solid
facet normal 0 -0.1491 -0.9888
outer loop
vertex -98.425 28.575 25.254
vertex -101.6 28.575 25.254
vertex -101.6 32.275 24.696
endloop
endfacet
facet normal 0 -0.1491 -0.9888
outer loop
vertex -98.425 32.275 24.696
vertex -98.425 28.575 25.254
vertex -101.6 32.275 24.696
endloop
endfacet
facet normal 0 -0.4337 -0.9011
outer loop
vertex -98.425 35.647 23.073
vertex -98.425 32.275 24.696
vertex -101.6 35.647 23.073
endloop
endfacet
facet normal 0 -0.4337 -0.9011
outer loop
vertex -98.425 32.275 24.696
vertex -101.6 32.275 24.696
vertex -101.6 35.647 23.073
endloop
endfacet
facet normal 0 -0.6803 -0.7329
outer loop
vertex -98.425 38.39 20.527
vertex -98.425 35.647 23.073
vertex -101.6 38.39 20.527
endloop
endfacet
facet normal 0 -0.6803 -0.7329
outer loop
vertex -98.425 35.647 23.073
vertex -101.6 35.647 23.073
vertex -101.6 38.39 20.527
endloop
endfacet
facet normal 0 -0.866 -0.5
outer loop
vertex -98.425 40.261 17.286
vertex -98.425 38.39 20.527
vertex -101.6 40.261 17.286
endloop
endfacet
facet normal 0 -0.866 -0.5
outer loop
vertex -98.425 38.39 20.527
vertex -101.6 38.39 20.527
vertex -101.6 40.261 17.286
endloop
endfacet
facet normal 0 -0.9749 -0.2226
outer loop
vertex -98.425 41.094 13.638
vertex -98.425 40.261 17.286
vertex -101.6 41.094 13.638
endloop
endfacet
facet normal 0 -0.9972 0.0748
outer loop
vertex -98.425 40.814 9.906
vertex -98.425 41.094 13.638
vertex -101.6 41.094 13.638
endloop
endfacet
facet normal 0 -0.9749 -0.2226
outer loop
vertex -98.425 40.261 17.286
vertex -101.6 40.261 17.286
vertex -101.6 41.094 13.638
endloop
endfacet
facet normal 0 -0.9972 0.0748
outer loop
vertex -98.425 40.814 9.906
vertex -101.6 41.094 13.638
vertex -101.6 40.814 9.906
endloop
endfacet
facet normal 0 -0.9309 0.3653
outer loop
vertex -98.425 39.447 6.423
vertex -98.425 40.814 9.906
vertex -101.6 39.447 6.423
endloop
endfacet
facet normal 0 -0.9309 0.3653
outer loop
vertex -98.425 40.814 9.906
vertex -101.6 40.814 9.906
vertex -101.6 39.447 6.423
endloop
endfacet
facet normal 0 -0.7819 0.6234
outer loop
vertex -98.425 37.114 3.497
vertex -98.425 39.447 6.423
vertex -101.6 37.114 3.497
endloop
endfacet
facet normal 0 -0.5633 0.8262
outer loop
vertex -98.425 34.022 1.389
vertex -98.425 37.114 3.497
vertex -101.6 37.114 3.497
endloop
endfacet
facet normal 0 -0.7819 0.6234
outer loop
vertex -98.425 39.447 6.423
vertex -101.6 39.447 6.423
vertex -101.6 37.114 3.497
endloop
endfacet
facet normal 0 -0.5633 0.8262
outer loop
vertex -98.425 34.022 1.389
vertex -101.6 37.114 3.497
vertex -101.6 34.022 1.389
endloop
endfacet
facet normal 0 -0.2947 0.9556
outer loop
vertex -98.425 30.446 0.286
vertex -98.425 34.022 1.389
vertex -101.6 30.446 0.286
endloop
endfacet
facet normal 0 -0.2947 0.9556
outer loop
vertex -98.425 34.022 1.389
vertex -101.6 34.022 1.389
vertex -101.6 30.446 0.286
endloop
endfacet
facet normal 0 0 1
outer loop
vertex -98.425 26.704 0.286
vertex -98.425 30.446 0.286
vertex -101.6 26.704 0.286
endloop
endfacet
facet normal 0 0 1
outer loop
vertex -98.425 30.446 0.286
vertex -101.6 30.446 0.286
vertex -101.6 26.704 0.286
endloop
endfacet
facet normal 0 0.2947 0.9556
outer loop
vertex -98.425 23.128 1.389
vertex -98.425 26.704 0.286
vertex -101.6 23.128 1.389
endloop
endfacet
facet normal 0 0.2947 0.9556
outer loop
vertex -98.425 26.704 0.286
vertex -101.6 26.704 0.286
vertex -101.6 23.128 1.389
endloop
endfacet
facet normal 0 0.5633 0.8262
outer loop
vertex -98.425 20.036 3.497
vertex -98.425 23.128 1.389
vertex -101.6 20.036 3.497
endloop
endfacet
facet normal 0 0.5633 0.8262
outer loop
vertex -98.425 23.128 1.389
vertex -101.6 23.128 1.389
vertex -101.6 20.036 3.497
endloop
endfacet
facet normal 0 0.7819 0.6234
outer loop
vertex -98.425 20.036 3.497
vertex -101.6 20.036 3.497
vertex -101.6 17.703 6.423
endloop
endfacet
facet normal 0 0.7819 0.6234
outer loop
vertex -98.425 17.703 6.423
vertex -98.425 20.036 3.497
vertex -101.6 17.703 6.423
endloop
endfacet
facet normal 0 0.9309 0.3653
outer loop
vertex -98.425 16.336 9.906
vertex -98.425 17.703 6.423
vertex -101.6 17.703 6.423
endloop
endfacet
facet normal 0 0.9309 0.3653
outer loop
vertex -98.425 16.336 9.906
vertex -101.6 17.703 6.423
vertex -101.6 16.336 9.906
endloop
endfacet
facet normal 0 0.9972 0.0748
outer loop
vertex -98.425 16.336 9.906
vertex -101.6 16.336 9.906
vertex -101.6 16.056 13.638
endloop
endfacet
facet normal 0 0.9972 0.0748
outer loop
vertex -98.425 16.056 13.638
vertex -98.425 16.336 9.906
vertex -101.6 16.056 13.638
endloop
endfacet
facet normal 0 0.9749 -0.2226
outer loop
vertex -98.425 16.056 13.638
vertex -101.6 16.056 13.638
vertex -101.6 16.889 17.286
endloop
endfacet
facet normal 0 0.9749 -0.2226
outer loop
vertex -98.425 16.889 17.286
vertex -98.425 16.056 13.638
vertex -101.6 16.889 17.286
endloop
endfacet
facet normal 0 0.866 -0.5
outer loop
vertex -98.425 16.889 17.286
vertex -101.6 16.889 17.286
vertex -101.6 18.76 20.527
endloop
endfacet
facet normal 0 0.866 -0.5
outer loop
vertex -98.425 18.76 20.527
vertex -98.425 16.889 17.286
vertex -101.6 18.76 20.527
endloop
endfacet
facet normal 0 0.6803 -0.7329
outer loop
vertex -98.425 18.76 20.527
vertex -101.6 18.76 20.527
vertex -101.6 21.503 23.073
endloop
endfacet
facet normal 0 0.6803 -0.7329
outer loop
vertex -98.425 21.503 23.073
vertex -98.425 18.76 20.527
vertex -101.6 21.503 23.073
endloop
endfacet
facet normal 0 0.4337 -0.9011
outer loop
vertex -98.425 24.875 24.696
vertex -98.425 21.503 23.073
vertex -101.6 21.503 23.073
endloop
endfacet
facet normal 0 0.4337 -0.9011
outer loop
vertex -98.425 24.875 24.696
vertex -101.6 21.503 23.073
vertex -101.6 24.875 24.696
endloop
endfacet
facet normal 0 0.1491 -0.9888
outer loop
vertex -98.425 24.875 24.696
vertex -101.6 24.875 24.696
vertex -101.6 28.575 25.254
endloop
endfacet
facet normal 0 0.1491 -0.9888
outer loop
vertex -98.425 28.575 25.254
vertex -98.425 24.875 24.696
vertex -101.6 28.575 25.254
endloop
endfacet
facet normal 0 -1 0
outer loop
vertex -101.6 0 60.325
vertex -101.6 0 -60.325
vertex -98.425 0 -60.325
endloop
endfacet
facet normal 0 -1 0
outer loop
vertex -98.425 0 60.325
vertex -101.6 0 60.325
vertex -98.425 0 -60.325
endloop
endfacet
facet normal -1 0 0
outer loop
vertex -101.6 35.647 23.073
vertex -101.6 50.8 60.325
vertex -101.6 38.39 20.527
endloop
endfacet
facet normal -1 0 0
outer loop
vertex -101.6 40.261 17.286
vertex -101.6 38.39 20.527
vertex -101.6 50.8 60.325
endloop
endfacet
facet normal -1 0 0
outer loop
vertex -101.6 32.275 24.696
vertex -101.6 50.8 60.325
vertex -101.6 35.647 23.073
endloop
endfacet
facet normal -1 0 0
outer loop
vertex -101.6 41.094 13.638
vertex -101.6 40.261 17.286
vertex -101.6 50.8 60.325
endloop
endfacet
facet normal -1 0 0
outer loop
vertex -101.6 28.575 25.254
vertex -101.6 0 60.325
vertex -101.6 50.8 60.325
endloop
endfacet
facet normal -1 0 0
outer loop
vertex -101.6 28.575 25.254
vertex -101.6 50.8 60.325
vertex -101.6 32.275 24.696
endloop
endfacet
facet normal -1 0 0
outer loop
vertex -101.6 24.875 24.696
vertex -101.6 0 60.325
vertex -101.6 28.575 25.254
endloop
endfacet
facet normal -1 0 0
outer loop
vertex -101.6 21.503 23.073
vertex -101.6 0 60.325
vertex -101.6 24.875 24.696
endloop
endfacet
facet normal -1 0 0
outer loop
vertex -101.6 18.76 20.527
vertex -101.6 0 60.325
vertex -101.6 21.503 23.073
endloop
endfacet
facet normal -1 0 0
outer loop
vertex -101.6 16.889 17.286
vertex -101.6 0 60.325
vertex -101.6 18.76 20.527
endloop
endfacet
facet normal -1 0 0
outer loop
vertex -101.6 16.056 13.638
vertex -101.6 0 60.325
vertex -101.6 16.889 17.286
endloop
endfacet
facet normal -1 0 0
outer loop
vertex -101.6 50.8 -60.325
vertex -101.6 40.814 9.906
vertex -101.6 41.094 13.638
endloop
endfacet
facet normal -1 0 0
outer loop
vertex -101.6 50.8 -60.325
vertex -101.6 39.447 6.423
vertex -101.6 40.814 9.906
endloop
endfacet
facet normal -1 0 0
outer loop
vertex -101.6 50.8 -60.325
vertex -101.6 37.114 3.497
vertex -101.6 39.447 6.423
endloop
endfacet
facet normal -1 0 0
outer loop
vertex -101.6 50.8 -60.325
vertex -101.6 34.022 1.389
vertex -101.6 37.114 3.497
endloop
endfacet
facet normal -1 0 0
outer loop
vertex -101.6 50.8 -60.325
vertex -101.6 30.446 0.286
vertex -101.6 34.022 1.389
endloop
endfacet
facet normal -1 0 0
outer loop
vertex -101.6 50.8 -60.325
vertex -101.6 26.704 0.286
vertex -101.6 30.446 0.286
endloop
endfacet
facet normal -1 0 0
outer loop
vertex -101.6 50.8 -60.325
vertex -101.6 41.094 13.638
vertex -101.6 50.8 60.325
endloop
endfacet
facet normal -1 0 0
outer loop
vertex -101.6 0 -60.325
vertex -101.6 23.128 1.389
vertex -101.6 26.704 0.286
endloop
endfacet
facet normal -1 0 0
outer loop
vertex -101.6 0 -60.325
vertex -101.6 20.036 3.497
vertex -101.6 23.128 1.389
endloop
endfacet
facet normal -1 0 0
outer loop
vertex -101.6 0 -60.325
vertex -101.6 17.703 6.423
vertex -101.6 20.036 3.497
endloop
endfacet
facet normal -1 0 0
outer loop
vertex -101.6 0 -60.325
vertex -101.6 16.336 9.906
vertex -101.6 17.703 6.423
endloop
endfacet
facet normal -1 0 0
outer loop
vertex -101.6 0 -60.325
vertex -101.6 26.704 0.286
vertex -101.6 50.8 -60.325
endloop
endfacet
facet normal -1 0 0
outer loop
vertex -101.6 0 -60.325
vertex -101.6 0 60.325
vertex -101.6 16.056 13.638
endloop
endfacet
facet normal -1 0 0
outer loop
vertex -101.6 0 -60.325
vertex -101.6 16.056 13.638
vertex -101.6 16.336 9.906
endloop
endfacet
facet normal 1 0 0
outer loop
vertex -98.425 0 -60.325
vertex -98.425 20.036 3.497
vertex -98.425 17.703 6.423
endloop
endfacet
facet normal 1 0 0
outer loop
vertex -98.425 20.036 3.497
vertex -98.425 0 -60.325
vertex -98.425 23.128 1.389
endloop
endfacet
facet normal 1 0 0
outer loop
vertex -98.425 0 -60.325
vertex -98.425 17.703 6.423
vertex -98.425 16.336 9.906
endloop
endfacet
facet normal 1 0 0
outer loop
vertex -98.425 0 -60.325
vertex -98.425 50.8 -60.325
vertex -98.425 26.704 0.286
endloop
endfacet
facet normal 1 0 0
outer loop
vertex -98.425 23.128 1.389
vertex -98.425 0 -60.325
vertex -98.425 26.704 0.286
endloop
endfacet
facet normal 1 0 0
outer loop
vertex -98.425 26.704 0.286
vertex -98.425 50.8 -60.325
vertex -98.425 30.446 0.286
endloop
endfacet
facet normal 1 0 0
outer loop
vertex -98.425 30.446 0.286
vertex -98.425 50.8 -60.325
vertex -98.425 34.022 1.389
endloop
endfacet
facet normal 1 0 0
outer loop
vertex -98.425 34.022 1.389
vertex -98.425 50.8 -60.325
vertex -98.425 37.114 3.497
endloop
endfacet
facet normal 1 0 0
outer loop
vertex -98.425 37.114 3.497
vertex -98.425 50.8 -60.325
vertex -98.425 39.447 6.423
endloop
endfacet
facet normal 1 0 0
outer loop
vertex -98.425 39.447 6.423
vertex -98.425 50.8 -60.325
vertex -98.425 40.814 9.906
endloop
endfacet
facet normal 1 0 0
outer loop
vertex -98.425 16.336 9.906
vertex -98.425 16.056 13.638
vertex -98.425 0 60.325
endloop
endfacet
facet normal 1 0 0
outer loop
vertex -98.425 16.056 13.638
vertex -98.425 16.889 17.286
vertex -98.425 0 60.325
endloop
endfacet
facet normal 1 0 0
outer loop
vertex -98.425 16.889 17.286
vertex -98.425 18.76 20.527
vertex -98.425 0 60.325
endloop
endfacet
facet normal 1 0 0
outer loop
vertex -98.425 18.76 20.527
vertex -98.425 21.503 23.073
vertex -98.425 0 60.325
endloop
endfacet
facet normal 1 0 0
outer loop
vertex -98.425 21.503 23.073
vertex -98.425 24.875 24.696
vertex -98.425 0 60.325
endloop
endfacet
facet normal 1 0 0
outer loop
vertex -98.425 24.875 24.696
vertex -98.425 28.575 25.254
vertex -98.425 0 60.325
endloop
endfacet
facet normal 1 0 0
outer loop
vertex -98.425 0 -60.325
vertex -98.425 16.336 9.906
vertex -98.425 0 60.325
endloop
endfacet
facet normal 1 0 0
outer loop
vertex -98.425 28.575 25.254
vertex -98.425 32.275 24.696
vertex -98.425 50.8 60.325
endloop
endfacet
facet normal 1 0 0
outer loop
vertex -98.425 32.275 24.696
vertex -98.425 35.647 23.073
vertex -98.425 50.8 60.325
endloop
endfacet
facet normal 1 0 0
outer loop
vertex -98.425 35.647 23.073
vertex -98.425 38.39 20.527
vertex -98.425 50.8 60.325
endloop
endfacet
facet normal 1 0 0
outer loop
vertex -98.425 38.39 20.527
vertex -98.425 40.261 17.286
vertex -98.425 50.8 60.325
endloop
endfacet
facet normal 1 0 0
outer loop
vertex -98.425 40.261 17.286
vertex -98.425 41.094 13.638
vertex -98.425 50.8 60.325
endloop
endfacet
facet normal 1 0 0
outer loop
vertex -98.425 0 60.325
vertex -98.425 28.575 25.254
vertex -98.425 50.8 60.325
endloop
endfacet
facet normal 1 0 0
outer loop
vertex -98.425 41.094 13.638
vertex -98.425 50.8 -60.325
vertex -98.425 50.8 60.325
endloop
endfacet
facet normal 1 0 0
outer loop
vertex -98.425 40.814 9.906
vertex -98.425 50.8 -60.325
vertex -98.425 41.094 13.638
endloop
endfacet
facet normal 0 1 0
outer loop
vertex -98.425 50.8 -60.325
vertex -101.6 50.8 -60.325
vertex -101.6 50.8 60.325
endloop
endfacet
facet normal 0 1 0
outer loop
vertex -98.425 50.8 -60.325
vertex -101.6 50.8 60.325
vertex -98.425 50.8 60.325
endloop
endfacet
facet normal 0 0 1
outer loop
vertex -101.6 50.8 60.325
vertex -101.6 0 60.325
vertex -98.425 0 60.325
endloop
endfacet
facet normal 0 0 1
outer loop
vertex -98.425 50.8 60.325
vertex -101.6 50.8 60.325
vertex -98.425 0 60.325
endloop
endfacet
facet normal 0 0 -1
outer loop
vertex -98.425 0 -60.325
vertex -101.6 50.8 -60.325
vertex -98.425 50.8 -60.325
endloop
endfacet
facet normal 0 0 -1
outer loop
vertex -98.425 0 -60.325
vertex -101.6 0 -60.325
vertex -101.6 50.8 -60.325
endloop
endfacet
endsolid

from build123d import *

# Parameters (mm, degrees)
SKETCH1_W           = 203.2
SKETCH1_H           = 120.65
BOSS_EXTRUDE1_DEPTH = 50.8
SKETCH2_W           = 196.85
SKETCH2_H           = 114.3
CUT_EXTRUDE1_DEPTH  = 51.8
SKETCH4_W           = 203.2
SKETCH4_H           = 120.65
SKETCH4_W_2         = 196.85
SKETCH4_H_2         = 114.3
BOSS_EXTRUDE2_DEPTH = 6.35
CUT_EXTRUDE5_DEPTH  = 121.65
CUT_EXTRUDE6_REACH  = 205.2
CUT_EXTRUDE7_REACH  = 205.2
SKETCH13_R          = 12.55395
CUT_EXTRUDE8_DEPTH  = 51.8


with BuildPart() as part:
    # Sketch1 → Boss-Extrude1 (new body)
    with BuildSketch(Plane(origin=(0, 0, 0), x_dir=(1, 0, 0), z_dir=(0, 1, 0))):
        Rectangle(SKETCH1_W, SKETCH1_H)
    extrude(amount=BOSS_EXTRUDE1_DEPTH)

    # Sketch2 → Cut-Extrude1 (cut, through all)
    with BuildSketch(Plane(origin=(0, 50.8, 0), x_dir=(1, 0, 0), z_dir=(0, 1, 0))):
        Rectangle(SKETCH2_W, SKETCH2_H)
    extrude(amount=-CUT_EXTRUDE1_DEPTH, mode=Mode.SUBTRACT)

    # Sketch4 → Boss-Extrude2 (add)
    with BuildSketch(Plane(origin=(0, 50.8, 0), x_dir=(1, 0, 0), z_dir=(0, 1, 0))):
        Rectangle(SKETCH4_W, SKETCH4_H)
        Rectangle(SKETCH4_W_2, SKETCH4_H_2, mode=Mode.SUBTRACT)
    extrude(amount=-BOSS_EXTRUDE2_DEPTH)

    # Sketch10 → Cut-Extrude5 (cut, through all)
    with BuildSketch(Plane.XY.offset(60.325)):
        with BuildLine():
            ThreePointArc((-65.9511, 22.225), (-81.206975571, 31.167602912), (-81.556705839, 13.4874))
            Line((-81.556705839, 13.4874), (-70.843294161, 13.4874))
            ThreePointArc((-70.843294161, 13.4874), (-67.257397088, 17.218024429), (-65.9511, 22.225))
        make_face()
        with BuildLine():
            ThreePointArc((-15.1511, 22.225), (-30.406975571, 31.167602912), (-30.756705839, 13.4874))
            Line((-30.756705839, 13.4874), (-20.043294161, 13.4874))
            ThreePointArc((-20.043294161, 13.4874), (-16.457397088, 17.218024429), (-15.1511, 22.225))
        make_face()
        with BuildLine():
            ThreePointArc((35.6489, 22.225), (20.393024429, 31.167602912), (20.043294161, 13.4874))
            Line((20.043294161, 13.4874), (30.756705839, 13.4874))
            ThreePointArc((30.756705839, 13.4874), (34.342602912, 17.218024429), (35.6489, 22.225))
        make_face()
        with BuildLine():
            Line((70.843294161, 13.4874), (81.556705839, 13.4874))
            ThreePointArc((81.556705839, 13.4874), (85.142602912, 17.218024429), (86.4489, 22.225))
            ThreePointArc((86.4489, 22.225), (71.193024429, 31.167602912), (70.843294161, 13.4874))
        make_face()
    extrude(amount=-CUT_EXTRUDE5_DEPTH, mode=Mode.SUBTRACT)

    # Sketch12 → Cut-Extrude6 (cut, up to next)
    with BuildSketch(Plane(origin=(101.6, 0, 0), x_dir=(0, 0, -1), z_dir=(1, 0, 0)), mode=Mode.PRIVATE) as cut_extrude6_sk1:
        with BuildLine():
            ThreePointArc((-16.868294161, 13.4874), (-22.225, 32.4739), (-27.581705839, 13.4874))
            Line((-27.581705839, 13.4874), (-16.868294161, 13.4874))
        make_face()
    cut_extrude6_tool1 = extrude(cut_extrude6_sk1.sketch, amount=-CUT_EXTRUDE6_REACH, mode=Mode.PRIVATE) & part.part
    add(cut_extrude6_tool1.solids().sort_by_distance((101.6, 22.546198, 22.225))[0], mode=Mode.SUBTRACT)
    # Sketch12 → Cut-Extrude6 (cut, up to next)
    with BuildSketch(Plane(origin=(101.6, 0, 0), x_dir=(0, 0, -1), z_dir=(1, 0, 0)), mode=Mode.PRIVATE) as cut_extrude6_sk2:
        with BuildLine():
            ThreePointArc((27.581705839, 13.4874), (22.225, 32.4739), (16.868294161, 13.4874))
            Line((16.868294161, 13.4874), (27.581705839, 13.4874))
        make_face()
    cut_extrude6_tool2 = extrude(cut_extrude6_sk2.sketch, amount=-CUT_EXTRUDE6_REACH, mode=Mode.PRIVATE) & part.part
    add(cut_extrude6_tool2.solids().sort_by_distance((101.6, 22.546198, -22.225))[0], mode=Mode.SUBTRACT)

    # Sketch13 → Cut-Extrude7 (cut, up to next)
    with BuildSketch(Plane.ZY.offset(101.6), mode=Mode.PRIVATE) as cut_extrude7_sk1:
        with Locations((12.7, 28.575)):
            Circle(SKETCH13_R)
    cut_extrude7_tool1 = extrude(cut_extrude7_sk1.sketch, amount=-CUT_EXTRUDE7_REACH, mode=Mode.PRIVATE) & part.part
    add(cut_extrude7_tool1.solids().sort_by_distance((-101.6, 28.575, 12.7))[0], mode=Mode.SUBTRACT)

    # Sketch14 → Cut-Extrude8 (cut, through all)
    with BuildSketch(Plane(origin=(0, 50.8, 0), x_dir=(1, 0, 0), z_dir=(0, 1, 0))):
        Polygon((-98.425, -57.15), (-98.425, -60.325), (101.6, -60.325), (101.6, 60.325), (-98.425, 60.325), align=None)
    extrude(amount=-CUT_EXTRUDE8_DEPTH, mode=Mode.SUBTRACT)


solid = part.part
